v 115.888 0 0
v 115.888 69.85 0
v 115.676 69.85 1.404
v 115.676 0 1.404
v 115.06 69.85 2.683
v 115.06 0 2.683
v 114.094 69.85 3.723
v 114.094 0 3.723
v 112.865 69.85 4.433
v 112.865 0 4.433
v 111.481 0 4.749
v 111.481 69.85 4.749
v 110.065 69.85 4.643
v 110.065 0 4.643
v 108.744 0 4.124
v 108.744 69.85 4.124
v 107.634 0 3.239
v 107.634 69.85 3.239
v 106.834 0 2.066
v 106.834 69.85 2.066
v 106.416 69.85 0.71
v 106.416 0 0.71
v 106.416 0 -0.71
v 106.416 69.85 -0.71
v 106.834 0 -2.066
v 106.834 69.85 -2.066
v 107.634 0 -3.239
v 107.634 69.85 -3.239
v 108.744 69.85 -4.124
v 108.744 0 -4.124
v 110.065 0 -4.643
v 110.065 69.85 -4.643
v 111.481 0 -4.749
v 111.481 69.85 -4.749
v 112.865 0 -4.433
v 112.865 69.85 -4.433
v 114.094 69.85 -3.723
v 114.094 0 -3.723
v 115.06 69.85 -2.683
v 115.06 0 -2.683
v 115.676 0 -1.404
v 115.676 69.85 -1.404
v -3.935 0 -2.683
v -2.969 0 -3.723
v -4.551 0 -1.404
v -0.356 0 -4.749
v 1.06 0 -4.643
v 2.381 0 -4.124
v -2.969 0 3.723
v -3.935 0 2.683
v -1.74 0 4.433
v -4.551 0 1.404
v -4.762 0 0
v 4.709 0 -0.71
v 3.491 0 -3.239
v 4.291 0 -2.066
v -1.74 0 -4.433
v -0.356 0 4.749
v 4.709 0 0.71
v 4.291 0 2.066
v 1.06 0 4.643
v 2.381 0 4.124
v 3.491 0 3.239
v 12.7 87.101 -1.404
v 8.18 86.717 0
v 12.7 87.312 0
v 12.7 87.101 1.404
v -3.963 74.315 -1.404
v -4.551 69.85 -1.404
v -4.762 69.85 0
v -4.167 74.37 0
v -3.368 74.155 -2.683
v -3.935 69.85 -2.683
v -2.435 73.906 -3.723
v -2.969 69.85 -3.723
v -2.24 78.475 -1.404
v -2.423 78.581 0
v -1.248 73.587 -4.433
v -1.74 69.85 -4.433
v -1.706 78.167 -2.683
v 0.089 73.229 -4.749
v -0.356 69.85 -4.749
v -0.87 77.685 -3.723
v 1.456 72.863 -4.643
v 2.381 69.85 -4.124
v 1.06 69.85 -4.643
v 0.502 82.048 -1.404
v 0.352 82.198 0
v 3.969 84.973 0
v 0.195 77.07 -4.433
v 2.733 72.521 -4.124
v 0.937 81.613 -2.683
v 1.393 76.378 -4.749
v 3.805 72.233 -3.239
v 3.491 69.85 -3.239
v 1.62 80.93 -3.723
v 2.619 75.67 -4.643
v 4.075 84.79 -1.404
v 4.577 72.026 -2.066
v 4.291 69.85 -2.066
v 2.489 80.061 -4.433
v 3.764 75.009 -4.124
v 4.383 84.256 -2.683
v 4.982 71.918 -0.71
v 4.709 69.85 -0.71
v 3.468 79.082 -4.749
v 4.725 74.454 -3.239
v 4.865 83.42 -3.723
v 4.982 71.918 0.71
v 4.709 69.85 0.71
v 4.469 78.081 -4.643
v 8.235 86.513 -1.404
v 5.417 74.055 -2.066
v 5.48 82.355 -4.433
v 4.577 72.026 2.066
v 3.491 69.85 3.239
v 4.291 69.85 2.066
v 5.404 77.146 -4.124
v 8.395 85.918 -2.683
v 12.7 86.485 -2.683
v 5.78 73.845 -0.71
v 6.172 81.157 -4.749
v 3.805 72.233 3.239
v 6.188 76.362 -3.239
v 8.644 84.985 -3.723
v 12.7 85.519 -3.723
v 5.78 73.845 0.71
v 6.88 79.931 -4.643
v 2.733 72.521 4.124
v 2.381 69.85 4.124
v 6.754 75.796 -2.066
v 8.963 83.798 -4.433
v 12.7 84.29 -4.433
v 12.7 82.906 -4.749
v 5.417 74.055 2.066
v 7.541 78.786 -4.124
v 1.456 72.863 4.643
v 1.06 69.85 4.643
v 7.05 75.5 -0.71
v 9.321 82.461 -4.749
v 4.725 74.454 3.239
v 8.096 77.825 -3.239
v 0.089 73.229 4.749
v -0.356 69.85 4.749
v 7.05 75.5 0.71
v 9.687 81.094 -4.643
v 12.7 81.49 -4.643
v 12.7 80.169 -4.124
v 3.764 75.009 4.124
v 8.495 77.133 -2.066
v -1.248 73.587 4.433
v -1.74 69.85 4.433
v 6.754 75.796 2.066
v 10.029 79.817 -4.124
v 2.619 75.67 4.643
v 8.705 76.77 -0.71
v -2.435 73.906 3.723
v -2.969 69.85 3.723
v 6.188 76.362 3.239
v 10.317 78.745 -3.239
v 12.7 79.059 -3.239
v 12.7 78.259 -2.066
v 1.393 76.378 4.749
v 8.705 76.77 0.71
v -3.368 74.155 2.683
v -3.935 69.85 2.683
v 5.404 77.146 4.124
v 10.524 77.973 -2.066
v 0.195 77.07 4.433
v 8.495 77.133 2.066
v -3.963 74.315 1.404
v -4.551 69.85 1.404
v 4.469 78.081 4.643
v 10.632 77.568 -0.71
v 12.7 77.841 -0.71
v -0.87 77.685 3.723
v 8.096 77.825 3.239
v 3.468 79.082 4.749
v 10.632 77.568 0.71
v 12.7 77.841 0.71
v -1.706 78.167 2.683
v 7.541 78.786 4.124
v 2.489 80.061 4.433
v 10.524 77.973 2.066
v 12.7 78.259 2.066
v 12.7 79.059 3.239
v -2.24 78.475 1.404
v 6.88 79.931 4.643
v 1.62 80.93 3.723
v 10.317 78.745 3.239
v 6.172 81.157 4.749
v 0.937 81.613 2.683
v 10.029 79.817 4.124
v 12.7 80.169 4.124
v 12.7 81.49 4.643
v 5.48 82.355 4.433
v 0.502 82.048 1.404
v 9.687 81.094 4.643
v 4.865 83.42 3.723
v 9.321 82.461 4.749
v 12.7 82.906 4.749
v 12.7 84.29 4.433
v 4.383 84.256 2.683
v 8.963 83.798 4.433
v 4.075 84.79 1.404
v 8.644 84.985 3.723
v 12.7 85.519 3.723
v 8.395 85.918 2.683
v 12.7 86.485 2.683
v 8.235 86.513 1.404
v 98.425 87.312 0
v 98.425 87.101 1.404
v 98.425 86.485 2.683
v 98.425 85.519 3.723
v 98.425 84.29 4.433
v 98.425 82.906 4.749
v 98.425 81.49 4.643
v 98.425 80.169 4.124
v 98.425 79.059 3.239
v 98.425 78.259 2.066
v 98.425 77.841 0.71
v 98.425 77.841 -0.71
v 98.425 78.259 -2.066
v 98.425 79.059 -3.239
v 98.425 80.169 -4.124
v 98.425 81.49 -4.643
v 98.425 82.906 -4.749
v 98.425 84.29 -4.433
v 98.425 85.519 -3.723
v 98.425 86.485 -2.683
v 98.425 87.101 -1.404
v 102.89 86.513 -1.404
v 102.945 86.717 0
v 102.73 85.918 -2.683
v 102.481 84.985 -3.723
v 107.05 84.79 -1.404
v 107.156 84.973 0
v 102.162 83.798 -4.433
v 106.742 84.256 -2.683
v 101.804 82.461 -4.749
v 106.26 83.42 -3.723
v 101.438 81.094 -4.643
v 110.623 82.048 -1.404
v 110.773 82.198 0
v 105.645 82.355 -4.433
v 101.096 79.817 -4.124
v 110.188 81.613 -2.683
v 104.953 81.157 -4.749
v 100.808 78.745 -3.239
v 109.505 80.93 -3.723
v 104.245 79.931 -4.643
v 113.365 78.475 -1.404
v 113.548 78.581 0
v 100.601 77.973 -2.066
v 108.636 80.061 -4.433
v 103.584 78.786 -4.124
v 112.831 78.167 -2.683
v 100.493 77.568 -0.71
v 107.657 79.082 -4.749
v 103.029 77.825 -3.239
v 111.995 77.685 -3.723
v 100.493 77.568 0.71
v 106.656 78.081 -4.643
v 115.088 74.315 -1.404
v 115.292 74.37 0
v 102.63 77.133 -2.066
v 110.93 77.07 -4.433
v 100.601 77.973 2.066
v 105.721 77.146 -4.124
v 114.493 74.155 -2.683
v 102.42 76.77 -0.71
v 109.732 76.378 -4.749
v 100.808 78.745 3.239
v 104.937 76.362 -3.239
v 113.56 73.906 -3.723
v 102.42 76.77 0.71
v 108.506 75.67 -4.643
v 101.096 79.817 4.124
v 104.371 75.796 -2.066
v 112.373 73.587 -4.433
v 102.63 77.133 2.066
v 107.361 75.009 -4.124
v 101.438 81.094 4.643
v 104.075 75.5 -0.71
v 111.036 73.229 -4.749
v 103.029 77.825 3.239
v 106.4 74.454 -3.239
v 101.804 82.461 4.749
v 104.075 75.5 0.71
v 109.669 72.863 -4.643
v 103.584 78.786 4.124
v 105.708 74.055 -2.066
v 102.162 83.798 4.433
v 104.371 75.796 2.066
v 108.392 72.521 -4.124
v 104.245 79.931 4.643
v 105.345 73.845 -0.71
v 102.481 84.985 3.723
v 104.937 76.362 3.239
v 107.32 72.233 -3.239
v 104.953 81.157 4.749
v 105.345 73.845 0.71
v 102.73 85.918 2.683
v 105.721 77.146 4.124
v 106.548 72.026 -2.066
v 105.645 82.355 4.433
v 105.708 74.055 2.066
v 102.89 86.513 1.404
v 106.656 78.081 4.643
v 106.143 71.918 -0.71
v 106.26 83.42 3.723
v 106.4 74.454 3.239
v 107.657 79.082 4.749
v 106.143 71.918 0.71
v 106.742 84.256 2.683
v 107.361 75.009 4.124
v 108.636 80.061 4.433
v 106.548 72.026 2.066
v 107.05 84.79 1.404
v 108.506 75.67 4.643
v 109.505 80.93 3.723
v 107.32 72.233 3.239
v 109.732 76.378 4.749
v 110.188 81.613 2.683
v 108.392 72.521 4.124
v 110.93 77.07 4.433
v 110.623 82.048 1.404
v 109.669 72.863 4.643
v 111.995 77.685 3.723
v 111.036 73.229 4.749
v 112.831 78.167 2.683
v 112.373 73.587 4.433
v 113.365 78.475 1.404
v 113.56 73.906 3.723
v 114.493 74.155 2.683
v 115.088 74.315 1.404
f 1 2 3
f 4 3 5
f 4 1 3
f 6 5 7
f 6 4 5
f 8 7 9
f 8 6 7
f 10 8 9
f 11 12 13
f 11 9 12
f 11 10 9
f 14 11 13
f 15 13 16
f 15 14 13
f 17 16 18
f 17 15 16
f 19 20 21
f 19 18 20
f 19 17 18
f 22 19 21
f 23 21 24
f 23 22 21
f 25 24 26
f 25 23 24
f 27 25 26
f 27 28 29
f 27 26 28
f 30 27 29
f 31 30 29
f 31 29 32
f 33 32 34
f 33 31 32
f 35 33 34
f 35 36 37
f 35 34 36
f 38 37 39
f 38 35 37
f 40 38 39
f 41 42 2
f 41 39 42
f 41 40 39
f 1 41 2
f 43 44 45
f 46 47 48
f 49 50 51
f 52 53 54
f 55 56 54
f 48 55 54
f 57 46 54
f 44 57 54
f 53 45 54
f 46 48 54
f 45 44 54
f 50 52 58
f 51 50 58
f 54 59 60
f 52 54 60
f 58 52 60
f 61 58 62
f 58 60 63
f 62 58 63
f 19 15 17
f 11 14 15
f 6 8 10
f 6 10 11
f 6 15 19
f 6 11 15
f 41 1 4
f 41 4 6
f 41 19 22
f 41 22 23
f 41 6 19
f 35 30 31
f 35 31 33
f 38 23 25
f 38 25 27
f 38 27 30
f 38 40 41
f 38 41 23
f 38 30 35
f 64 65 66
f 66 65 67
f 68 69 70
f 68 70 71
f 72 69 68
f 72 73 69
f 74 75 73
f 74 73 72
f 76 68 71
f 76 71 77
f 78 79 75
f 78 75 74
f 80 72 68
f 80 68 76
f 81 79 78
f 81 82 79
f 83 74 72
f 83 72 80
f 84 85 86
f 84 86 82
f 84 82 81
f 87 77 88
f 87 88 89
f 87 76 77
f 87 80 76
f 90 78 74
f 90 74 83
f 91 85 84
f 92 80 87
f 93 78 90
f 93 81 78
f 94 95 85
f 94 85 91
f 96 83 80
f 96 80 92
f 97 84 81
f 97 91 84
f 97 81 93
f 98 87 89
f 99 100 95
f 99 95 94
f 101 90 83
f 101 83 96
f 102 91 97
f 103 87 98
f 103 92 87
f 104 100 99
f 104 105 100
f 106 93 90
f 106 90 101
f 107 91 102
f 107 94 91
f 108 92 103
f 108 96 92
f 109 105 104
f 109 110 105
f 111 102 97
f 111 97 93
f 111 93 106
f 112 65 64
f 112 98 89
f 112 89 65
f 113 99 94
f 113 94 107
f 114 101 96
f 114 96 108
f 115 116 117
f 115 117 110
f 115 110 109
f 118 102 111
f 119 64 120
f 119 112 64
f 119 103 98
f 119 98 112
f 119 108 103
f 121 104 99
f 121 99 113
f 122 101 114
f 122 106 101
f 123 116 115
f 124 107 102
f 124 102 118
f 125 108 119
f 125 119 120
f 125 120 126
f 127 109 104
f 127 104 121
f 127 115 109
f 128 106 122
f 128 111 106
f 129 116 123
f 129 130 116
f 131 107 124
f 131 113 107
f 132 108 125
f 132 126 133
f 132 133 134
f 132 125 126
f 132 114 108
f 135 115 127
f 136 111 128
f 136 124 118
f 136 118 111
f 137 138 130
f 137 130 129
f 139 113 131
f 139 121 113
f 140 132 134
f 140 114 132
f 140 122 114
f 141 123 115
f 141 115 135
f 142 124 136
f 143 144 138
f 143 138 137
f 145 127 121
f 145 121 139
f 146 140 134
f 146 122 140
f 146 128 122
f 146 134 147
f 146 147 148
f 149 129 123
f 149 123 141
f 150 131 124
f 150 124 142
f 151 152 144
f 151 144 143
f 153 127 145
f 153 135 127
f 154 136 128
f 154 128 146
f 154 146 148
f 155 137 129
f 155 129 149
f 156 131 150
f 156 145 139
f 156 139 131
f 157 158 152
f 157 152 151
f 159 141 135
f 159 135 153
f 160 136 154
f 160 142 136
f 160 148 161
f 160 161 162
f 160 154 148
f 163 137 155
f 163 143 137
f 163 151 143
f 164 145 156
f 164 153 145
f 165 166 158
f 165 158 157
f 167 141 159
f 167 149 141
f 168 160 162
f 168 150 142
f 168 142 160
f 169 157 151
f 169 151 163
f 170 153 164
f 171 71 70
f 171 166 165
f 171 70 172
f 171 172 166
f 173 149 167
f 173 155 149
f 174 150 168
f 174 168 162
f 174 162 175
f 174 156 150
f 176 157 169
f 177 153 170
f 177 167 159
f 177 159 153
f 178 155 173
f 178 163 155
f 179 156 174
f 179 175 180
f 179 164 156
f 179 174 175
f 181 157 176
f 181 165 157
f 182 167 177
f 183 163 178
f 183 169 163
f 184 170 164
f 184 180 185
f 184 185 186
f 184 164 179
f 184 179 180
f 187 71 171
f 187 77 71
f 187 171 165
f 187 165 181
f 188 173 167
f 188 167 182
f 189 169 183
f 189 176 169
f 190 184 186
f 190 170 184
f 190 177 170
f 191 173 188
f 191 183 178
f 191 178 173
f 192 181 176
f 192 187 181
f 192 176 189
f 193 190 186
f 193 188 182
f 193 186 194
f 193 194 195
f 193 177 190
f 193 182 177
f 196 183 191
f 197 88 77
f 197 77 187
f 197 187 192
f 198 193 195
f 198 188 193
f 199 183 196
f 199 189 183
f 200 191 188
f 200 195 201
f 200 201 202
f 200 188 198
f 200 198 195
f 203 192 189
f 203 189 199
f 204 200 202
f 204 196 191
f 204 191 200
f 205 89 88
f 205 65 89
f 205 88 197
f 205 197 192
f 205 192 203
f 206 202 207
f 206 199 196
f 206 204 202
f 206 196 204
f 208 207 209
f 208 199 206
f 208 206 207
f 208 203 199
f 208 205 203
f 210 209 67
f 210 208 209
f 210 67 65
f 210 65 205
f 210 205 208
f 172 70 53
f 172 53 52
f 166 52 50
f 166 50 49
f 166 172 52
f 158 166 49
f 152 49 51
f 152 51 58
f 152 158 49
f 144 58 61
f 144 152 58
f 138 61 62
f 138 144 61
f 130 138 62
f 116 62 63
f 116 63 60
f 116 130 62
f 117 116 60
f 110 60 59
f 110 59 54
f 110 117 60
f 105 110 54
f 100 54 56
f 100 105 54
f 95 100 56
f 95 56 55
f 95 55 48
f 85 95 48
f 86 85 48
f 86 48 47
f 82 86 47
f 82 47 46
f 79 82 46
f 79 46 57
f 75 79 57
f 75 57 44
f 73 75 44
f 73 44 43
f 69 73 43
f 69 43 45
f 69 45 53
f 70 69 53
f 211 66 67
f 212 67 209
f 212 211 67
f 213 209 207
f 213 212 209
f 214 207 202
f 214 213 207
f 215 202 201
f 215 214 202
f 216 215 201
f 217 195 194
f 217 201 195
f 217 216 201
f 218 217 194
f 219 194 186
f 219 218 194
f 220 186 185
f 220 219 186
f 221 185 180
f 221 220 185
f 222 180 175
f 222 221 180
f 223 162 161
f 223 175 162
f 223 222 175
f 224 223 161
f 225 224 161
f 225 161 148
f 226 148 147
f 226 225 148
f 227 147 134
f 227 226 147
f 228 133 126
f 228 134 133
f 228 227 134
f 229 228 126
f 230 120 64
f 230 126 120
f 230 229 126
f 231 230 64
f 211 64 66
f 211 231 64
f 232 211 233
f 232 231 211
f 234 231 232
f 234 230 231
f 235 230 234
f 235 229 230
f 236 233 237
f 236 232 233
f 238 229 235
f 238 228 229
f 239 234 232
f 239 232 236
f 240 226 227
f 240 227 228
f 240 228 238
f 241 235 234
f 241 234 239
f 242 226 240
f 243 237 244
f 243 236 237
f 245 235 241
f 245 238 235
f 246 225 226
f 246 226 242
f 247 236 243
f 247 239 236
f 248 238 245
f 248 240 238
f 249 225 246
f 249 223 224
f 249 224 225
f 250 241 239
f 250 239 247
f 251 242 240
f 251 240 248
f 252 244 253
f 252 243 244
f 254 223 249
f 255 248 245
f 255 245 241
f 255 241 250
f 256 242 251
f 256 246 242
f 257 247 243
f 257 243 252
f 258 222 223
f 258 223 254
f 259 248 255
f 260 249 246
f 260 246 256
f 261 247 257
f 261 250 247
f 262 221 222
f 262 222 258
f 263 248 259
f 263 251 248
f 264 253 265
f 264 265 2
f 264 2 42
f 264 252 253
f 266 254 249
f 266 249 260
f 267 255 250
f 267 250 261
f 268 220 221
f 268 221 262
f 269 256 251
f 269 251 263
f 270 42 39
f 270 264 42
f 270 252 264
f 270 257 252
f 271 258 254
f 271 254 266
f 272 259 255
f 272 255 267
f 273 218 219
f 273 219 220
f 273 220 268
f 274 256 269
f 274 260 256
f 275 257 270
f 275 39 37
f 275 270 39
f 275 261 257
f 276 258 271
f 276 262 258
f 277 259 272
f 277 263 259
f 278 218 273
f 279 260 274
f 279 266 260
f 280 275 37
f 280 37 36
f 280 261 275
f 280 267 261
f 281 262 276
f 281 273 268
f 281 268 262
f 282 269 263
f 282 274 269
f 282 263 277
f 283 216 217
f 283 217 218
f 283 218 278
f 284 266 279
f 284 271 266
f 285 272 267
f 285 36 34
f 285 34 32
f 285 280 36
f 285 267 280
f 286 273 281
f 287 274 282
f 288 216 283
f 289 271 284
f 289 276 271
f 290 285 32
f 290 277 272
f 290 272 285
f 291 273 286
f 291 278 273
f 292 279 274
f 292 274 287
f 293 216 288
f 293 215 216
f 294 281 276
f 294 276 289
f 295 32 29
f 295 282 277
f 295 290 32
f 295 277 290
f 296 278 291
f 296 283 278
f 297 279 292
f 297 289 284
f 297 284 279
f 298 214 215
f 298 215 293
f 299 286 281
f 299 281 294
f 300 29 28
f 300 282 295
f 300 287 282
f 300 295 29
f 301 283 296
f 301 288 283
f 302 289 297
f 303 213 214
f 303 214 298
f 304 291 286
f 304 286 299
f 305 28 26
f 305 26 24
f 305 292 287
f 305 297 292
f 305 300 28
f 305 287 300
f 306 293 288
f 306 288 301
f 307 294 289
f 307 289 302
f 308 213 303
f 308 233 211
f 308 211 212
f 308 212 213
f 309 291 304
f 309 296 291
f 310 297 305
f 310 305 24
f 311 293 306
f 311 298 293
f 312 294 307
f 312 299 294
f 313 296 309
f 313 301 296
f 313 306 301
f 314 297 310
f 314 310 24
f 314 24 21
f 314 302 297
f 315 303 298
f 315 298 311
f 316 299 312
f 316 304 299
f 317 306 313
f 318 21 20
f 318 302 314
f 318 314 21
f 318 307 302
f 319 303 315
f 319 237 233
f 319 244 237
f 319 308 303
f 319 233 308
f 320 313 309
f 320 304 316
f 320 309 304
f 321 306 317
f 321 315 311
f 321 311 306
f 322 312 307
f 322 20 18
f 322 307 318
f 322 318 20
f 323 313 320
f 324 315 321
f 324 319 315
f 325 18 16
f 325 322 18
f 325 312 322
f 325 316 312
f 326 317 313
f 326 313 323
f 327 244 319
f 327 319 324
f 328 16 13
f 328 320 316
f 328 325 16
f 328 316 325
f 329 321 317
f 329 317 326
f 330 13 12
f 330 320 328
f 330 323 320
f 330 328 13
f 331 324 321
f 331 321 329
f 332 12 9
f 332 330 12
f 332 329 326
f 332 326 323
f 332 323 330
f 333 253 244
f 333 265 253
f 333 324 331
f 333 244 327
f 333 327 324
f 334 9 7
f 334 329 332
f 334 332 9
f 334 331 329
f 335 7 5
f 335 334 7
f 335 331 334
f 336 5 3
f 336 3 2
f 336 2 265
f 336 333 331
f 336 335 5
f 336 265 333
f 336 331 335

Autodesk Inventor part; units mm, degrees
ref_plane "YZ Plane" through (0, 0, 0) normal (1, 0, 0) x (0, 1, 0)
ref_plane "XZ Plane" through (0, 0, 0) normal (0, 1, 0) x (-1, 0, 0)
ref_plane "XY Plane" through (0, 0, 0) normal (0, 0, 1) x (1, 0, 0)
sketch "Sketch1" plane through (0, 0, 0) normal (0, 0, 1) x (1, 0, 0)
  line L0 (0, 0) -> (0, 69.85)
  line L1 (12.7, 82.55) -> (98.425, 82.55)
  line L2 (111.125, 69.85) -> (111.125, 0)
  arc A0 (12.7, 82.55) -> (0, 69.85) centre (12.7, 69.85) ccw
  arc A1 (111.125, 69.85) -> (98.425, 82.55) centre (98.425, 69.85) ccw
  point P0 (0, 82.55)
  point P1 (111.125, 82.55)
  dimension "d0" = 82.55
  dimension "d1" = 111.125
  dimension "d2" = 82.55
  dimension "d4" = 12.7
sketch "Sketch2" plane through (0, 0, 0) normal (0, 1, 0) x (-1, 0, 0)
  circle A0 centre (0, 0) radius 4.7625
  dimension "d3" = 9.525
sweep "Sweep1" add profiles "Sketch2" path "Sketch1"
thread "Thread1"
thread "Thread2"
properties part number "u-bolt handle"
